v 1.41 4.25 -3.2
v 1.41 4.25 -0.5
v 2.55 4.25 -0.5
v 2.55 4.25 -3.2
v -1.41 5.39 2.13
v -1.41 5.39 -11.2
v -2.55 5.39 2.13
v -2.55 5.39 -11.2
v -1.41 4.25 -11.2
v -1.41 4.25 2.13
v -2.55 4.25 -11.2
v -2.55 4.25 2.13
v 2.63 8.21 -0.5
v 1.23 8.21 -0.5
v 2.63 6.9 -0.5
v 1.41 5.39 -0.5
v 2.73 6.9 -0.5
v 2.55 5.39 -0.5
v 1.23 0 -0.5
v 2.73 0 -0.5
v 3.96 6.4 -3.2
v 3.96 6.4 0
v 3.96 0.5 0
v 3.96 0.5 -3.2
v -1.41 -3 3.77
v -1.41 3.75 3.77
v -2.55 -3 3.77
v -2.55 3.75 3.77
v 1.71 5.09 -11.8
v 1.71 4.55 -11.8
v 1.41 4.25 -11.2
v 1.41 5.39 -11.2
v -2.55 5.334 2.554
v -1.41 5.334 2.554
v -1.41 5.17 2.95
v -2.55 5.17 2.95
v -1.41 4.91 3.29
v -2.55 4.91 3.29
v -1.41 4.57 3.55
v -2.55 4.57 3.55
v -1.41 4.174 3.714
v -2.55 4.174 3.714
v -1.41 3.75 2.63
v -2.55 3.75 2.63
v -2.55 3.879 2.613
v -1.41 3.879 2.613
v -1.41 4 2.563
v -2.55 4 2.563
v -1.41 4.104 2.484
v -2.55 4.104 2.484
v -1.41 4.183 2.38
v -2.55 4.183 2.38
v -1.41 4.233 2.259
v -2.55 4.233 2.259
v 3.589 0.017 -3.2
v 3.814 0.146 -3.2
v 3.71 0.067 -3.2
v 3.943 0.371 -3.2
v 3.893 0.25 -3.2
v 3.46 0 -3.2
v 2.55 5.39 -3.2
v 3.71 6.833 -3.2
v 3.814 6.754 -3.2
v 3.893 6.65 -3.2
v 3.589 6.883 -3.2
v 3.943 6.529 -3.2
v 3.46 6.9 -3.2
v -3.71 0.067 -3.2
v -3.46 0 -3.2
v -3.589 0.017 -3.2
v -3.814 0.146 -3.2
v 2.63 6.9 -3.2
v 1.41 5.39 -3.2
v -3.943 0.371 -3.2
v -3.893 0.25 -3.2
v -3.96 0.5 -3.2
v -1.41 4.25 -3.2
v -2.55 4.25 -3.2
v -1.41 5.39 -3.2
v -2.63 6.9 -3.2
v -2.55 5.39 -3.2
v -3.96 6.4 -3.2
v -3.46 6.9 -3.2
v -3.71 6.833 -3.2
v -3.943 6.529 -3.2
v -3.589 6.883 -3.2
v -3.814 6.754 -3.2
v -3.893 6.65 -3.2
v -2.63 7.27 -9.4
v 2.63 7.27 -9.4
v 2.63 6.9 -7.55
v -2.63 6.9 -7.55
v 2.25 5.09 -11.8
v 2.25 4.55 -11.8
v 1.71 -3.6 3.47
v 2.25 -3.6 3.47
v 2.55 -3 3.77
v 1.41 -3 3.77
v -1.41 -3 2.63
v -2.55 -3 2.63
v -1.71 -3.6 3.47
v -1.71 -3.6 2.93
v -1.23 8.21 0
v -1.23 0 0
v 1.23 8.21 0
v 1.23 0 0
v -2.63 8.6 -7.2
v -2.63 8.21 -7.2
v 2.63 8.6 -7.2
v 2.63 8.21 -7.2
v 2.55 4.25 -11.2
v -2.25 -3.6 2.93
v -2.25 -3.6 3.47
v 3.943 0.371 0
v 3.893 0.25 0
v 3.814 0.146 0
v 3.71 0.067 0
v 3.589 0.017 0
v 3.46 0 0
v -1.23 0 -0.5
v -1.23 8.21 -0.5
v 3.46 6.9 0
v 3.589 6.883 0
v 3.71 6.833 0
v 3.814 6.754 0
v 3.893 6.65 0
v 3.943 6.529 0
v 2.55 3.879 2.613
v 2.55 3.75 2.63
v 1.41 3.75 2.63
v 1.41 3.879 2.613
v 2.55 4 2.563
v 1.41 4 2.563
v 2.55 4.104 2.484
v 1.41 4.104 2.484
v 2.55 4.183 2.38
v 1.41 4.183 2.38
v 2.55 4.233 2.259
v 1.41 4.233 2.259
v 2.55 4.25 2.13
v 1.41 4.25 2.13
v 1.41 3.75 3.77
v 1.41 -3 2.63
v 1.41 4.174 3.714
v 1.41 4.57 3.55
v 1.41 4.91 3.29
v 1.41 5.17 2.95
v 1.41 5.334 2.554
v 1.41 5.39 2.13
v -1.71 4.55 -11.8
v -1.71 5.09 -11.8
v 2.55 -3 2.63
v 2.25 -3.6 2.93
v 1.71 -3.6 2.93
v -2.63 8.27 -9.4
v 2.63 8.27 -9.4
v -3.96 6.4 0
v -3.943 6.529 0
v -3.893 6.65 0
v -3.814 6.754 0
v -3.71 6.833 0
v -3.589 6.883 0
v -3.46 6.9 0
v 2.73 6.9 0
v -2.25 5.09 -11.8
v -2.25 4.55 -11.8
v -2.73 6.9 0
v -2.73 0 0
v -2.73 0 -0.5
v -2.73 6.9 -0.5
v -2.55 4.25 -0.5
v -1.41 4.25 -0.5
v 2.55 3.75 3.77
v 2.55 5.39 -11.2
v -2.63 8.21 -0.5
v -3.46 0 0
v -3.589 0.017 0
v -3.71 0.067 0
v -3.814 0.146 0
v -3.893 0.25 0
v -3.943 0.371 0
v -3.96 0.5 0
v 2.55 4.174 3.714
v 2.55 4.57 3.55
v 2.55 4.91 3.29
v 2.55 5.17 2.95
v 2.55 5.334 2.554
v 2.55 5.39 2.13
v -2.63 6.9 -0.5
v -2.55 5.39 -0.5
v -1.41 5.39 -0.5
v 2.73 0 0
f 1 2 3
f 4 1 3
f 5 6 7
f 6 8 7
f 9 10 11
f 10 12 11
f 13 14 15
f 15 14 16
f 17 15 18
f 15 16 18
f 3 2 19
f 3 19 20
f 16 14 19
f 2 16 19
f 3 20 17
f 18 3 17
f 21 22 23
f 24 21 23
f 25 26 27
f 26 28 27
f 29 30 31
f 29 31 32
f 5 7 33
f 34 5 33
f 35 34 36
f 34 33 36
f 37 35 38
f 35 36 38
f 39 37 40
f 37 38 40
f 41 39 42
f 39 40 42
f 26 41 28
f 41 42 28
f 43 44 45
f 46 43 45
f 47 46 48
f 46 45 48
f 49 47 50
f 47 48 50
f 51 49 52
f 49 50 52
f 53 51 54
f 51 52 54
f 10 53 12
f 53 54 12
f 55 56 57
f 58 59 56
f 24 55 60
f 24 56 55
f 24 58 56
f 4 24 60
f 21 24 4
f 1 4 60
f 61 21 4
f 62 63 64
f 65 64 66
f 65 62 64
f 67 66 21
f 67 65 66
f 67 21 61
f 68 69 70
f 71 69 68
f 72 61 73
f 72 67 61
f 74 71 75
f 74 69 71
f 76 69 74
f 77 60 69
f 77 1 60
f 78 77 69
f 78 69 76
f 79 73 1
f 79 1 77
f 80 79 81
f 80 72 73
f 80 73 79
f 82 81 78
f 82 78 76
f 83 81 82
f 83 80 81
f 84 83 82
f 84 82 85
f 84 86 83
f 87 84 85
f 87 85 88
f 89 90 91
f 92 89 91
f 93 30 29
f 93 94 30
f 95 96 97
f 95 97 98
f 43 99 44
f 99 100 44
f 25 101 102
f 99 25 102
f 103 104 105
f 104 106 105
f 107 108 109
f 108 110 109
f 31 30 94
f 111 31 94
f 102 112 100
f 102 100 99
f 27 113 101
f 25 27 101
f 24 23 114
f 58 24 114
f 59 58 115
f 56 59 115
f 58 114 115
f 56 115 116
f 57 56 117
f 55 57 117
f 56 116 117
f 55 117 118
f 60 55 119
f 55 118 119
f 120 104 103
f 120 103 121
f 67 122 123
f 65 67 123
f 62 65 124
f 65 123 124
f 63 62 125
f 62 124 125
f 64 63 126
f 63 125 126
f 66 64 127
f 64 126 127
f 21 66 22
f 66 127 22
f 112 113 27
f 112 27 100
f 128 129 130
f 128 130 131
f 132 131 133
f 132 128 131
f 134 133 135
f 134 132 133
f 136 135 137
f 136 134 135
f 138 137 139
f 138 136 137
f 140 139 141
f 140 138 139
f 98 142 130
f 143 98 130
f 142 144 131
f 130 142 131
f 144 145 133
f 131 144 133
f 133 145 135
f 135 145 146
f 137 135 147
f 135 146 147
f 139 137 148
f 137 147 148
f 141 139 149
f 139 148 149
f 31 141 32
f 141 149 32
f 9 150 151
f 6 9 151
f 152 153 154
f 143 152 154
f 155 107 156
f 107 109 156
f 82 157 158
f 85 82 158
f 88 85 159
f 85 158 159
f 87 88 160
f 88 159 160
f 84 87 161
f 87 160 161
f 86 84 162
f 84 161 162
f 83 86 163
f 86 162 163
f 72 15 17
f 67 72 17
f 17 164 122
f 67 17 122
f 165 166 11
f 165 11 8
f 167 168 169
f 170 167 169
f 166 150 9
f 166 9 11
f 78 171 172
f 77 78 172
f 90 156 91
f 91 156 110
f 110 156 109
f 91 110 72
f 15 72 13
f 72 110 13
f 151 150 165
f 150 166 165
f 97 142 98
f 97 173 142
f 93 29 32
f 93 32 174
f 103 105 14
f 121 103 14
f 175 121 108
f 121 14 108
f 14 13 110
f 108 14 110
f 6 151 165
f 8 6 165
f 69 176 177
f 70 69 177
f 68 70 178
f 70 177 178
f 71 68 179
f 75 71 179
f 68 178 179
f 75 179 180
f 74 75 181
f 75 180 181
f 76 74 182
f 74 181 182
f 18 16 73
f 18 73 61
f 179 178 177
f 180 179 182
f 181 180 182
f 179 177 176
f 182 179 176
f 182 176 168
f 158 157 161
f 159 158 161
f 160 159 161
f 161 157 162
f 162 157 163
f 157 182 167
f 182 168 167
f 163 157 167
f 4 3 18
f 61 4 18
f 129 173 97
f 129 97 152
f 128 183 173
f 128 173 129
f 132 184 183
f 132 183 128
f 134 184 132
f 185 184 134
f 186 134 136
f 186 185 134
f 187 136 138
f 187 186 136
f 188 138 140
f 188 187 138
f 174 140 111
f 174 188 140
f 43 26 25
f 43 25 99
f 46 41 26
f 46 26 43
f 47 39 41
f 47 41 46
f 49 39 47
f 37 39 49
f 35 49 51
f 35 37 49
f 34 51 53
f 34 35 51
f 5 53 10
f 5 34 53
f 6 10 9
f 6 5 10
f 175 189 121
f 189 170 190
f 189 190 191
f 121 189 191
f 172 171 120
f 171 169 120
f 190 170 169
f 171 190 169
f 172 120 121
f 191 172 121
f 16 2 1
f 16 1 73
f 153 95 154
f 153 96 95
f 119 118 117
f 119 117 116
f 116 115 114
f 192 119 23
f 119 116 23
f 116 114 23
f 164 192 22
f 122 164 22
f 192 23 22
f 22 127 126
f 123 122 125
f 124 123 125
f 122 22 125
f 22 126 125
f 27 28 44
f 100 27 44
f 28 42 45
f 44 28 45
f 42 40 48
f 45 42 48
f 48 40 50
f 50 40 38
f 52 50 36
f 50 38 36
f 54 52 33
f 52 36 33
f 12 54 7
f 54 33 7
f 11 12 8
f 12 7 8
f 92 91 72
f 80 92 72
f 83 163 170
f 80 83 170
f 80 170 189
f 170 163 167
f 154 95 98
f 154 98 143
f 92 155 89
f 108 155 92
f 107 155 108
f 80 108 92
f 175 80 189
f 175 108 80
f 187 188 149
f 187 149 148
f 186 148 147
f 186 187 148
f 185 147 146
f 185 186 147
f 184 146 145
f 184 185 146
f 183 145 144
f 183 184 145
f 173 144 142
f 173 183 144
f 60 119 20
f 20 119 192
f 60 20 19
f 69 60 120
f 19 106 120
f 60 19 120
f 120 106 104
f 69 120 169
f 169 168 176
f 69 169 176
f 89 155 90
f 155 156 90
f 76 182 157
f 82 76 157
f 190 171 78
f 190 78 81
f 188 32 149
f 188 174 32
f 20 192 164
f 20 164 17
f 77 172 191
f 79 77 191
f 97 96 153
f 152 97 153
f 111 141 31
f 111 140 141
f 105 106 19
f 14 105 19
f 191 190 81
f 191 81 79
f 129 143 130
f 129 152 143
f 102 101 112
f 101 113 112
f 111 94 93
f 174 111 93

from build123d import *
from OCP.BRepFilletAPI import BRepFilletAPI_MakeChamfer

# Parameters (mm, degrees)
BOSS_EXTRUDE1_DEPTH     = 0.57
CHAMFER1_SIZE           = 0.6
CHAMFER1_SIZE2          = 0.3
SKETCH3_W               = 1.14
SKETCH3_H               = 1.14
BOSS_EXTRUDE2_DEPTH     = 3.2
BOSS_EXTRUDE3_DEPTH     = 2.63
CUT_EXTRUDE1_DEPTH      = 16.128833399
CUT_EXTRUDE1_DEPTH_BACK = 16.128833399
SKETCH4_W               = 1.5
SKETCH4_H               = 0.5


with BuildPart() as part:
    # Sketch2 → Boss-Extrude1 (new, symmetric)
    with BuildSketch(Plane(origin=(1.98, 0, 0), x_dir=(0, 0, -1), z_dir=(1, 0, 0))):
        with BuildLine():
            Line((-2.63, -3.6), (-2.63, 3.75))
            ThreePointArc((-2.63, 3.75), (-2.483553391, 4.103553391), (-2.13, 4.25))
            Line((-2.13, 4.25), (11.8, 4.25))
            Line((11.8, 4.25), (11.8, 5.39))
            Line((11.8, 5.39), (-2.13, 5.39))
            ThreePointArc((-2.13, 5.39), (-3.289655121, 4.909655121), (-3.77, 3.75))
            Line((-3.77, 3.75), (-3.77, -3.6))
            Line((-3.77, -3.6), (-2.63, -3.6))
        make_face()
    extrude(amount=BOSS_EXTRUDE1_DEPTH, both=True)

    # Chamfer1: one chamfer whose edges measure the first distance from different faces: ONE call of the kernel's chamfer builder (chamfer() names one face for all edges)
    chamfer1_edges_1 = [part.edges().sort_by_distance(p)[0] for p in [
        (1.41, -3.6, 3.2),
        (1.41, 4.82, -11.8),
    ]]
    chamfer1_side_1 = [part.faces().sort_by_distance(p)[0] for p in [
        (1.41, 0.075, 3.590209845),
    ]]
    chamfer1_edges_2 = [part.edges().sort_by_distance(p)[0] for p in [
        (1.98, -3.6, 3.77),
    ]]
    chamfer1_side_2 = [part.faces().sort_by_distance(p)[0] for p in [
        (1.98, 0.075, 3.77),
    ]]
    chamfer1_edges_3 = [part.edges().sort_by_distance(p)[0] for p in [
        (1.98, 5.39, -11.8),
    ]]
    chamfer1_side_3 = [part.faces().sort_by_distance(p)[0] for p in [
        (1.98, 5.39, -4.835),
    ]]
    chamfer1_edges_4 = [part.edges().sort_by_distance(p)[0] for p in [
        (1.98, 4.25, -11.8),
    ]]
    chamfer1_side_4 = [part.faces().sort_by_distance(p)[0] for p in [
        (1.98, 4.25, -4.835),
    ]]
    chamfer1_edges_5 = [part.edges().sort_by_distance(p)[0] for p in [
        (1.98, -3.6, 2.63),
    ]]
    chamfer1_side_5 = [part.faces().sort_by_distance(p)[0] for p in [
        (1.98, 0.075, 2.63),
    ]]
    chamfer1_edges_6 = [part.edges().sort_by_distance(p)[0] for p in [
        (2.55, 4.82, -11.8),
        (2.55, -3.6, 3.2),
    ]]
    chamfer1_side_6 = [part.faces().sort_by_distance(p)[0] for p in [
        (2.55, 0.075, 3.590209845),
    ]]
    chamfer1 = BRepFilletAPI_MakeChamfer(part.part.solid().wrapped)
    for e in chamfer1_edges_1:
        chamfer1.Add(CHAMFER1_SIZE, CHAMFER1_SIZE2, e.wrapped, chamfer1_side_1[0].wrapped)  # the first distance lies on this face
    for e in chamfer1_edges_2:
        chamfer1.Add(CHAMFER1_SIZE, CHAMFER1_SIZE2, e.wrapped, chamfer1_side_2[0].wrapped)  # the first distance lies on this face
    for e in chamfer1_edges_3:
        chamfer1.Add(CHAMFER1_SIZE, CHAMFER1_SIZE2, e.wrapped, chamfer1_side_3[0].wrapped)  # the first distance lies on this face
    for e in chamfer1_edges_4:
        chamfer1.Add(CHAMFER1_SIZE, CHAMFER1_SIZE2, e.wrapped, chamfer1_side_4[0].wrapped)  # the first distance lies on this face
    for e in chamfer1_edges_5:
        chamfer1.Add(CHAMFER1_SIZE, CHAMFER1_SIZE2, e.wrapped, chamfer1_side_5[0].wrapped)  # the first distance lies on this face
    for e in chamfer1_edges_6:
        chamfer1.Add(CHAMFER1_SIZE, CHAMFER1_SIZE2, e.wrapped, chamfer1_side_6[0].wrapped)  # the first distance lies on this face
    add(Compound.cast(chamfer1.Shape()), mode=Mode.REPLACE)


with BuildPart() as body_2:
    # Mirror2: mirrored copy
    add(part.part.mirror(Plane(origin=(0, 0, 0), x_dir=(0, 0, 1), z_dir=(1, 0, 0))))


with BuildPart() as body_3:
    # Sketch3 → Boss-Extrude2 (new body)
    with BuildSketch(Plane.XY):
        with BuildLine():
            Line((-3.46, 6.9), (3.46, 6.9))
            ThreePointArc((3.46, 6.9), (3.813553391, 6.753553391), (3.96, 6.4))
            Line((3.96, 6.4), (3.96, 0.5))
            ThreePointArc((3.96, 0.5), (3.813553391, 0.146446609), (3.46, 0))
            Line((3.46, 0), (-3.46, 0))
            ThreePointArc((-3.46, 0), (-3.813553391, 0.146446609), (-3.96, 0.5))
            Line((-3.96, 0.5), (-3.96, 6.4))
            ThreePointArc((-3.96, 6.4), (-3.813553391, 6.753553391), (-3.46, 6.9))
        make_face()
        with Locations((-1.98, 4.82)):
            Rectangle(SKETCH3_W, SKETCH3_H, mode=Mode.SUBTRACT)
        with Locations((1.98, 4.82)):
            Rectangle(SKETCH3_W, SKETCH3_H, mode=Mode.SUBTRACT)
    extrude(amount=-BOSS_EXTRUDE2_DEPTH)

    # Sketch6 → Boss-Extrude3 (add, symmetric)
    with BuildSketch(Plane(origin=(0, 0, 0), x_dir=(0, 0, -1), z_dir=(1, 0, 0))):
        Polygon((0, 6.9), (0, 8.21), (7.2, 8.21), (7.2, 8.6), (9.4, 8.27), (9.4, 7.27), (7.55, 6.9), align=None)
    extrude(amount=BOSS_EXTRUDE3_DEPTH, both=True)

    # Sketch4 → Cut-Extrude1 (cut, two sides: drawn at the far end of the back side and taken through both)
    with BuildSketch(Plane(origin=(0, 0, 0), x_dir=(1, 0, 0), z_dir=(0, 1, 0)).offset(-CUT_EXTRUDE1_DEPTH_BACK)):
        with Locations((-1.98, 0.25)):
            Rectangle(SKETCH4_W, SKETCH4_H)
        with Locations((1.98, 0.25)):
            Rectangle(SKETCH4_W, SKETCH4_H)
    extrude(amount=CUT_EXTRUDE1_DEPTH + CUT_EXTRUDE1_DEPTH_BACK, mode=Mode.SUBTRACT)


solid = Compound([part.part, body_2.part, body_3.part])
